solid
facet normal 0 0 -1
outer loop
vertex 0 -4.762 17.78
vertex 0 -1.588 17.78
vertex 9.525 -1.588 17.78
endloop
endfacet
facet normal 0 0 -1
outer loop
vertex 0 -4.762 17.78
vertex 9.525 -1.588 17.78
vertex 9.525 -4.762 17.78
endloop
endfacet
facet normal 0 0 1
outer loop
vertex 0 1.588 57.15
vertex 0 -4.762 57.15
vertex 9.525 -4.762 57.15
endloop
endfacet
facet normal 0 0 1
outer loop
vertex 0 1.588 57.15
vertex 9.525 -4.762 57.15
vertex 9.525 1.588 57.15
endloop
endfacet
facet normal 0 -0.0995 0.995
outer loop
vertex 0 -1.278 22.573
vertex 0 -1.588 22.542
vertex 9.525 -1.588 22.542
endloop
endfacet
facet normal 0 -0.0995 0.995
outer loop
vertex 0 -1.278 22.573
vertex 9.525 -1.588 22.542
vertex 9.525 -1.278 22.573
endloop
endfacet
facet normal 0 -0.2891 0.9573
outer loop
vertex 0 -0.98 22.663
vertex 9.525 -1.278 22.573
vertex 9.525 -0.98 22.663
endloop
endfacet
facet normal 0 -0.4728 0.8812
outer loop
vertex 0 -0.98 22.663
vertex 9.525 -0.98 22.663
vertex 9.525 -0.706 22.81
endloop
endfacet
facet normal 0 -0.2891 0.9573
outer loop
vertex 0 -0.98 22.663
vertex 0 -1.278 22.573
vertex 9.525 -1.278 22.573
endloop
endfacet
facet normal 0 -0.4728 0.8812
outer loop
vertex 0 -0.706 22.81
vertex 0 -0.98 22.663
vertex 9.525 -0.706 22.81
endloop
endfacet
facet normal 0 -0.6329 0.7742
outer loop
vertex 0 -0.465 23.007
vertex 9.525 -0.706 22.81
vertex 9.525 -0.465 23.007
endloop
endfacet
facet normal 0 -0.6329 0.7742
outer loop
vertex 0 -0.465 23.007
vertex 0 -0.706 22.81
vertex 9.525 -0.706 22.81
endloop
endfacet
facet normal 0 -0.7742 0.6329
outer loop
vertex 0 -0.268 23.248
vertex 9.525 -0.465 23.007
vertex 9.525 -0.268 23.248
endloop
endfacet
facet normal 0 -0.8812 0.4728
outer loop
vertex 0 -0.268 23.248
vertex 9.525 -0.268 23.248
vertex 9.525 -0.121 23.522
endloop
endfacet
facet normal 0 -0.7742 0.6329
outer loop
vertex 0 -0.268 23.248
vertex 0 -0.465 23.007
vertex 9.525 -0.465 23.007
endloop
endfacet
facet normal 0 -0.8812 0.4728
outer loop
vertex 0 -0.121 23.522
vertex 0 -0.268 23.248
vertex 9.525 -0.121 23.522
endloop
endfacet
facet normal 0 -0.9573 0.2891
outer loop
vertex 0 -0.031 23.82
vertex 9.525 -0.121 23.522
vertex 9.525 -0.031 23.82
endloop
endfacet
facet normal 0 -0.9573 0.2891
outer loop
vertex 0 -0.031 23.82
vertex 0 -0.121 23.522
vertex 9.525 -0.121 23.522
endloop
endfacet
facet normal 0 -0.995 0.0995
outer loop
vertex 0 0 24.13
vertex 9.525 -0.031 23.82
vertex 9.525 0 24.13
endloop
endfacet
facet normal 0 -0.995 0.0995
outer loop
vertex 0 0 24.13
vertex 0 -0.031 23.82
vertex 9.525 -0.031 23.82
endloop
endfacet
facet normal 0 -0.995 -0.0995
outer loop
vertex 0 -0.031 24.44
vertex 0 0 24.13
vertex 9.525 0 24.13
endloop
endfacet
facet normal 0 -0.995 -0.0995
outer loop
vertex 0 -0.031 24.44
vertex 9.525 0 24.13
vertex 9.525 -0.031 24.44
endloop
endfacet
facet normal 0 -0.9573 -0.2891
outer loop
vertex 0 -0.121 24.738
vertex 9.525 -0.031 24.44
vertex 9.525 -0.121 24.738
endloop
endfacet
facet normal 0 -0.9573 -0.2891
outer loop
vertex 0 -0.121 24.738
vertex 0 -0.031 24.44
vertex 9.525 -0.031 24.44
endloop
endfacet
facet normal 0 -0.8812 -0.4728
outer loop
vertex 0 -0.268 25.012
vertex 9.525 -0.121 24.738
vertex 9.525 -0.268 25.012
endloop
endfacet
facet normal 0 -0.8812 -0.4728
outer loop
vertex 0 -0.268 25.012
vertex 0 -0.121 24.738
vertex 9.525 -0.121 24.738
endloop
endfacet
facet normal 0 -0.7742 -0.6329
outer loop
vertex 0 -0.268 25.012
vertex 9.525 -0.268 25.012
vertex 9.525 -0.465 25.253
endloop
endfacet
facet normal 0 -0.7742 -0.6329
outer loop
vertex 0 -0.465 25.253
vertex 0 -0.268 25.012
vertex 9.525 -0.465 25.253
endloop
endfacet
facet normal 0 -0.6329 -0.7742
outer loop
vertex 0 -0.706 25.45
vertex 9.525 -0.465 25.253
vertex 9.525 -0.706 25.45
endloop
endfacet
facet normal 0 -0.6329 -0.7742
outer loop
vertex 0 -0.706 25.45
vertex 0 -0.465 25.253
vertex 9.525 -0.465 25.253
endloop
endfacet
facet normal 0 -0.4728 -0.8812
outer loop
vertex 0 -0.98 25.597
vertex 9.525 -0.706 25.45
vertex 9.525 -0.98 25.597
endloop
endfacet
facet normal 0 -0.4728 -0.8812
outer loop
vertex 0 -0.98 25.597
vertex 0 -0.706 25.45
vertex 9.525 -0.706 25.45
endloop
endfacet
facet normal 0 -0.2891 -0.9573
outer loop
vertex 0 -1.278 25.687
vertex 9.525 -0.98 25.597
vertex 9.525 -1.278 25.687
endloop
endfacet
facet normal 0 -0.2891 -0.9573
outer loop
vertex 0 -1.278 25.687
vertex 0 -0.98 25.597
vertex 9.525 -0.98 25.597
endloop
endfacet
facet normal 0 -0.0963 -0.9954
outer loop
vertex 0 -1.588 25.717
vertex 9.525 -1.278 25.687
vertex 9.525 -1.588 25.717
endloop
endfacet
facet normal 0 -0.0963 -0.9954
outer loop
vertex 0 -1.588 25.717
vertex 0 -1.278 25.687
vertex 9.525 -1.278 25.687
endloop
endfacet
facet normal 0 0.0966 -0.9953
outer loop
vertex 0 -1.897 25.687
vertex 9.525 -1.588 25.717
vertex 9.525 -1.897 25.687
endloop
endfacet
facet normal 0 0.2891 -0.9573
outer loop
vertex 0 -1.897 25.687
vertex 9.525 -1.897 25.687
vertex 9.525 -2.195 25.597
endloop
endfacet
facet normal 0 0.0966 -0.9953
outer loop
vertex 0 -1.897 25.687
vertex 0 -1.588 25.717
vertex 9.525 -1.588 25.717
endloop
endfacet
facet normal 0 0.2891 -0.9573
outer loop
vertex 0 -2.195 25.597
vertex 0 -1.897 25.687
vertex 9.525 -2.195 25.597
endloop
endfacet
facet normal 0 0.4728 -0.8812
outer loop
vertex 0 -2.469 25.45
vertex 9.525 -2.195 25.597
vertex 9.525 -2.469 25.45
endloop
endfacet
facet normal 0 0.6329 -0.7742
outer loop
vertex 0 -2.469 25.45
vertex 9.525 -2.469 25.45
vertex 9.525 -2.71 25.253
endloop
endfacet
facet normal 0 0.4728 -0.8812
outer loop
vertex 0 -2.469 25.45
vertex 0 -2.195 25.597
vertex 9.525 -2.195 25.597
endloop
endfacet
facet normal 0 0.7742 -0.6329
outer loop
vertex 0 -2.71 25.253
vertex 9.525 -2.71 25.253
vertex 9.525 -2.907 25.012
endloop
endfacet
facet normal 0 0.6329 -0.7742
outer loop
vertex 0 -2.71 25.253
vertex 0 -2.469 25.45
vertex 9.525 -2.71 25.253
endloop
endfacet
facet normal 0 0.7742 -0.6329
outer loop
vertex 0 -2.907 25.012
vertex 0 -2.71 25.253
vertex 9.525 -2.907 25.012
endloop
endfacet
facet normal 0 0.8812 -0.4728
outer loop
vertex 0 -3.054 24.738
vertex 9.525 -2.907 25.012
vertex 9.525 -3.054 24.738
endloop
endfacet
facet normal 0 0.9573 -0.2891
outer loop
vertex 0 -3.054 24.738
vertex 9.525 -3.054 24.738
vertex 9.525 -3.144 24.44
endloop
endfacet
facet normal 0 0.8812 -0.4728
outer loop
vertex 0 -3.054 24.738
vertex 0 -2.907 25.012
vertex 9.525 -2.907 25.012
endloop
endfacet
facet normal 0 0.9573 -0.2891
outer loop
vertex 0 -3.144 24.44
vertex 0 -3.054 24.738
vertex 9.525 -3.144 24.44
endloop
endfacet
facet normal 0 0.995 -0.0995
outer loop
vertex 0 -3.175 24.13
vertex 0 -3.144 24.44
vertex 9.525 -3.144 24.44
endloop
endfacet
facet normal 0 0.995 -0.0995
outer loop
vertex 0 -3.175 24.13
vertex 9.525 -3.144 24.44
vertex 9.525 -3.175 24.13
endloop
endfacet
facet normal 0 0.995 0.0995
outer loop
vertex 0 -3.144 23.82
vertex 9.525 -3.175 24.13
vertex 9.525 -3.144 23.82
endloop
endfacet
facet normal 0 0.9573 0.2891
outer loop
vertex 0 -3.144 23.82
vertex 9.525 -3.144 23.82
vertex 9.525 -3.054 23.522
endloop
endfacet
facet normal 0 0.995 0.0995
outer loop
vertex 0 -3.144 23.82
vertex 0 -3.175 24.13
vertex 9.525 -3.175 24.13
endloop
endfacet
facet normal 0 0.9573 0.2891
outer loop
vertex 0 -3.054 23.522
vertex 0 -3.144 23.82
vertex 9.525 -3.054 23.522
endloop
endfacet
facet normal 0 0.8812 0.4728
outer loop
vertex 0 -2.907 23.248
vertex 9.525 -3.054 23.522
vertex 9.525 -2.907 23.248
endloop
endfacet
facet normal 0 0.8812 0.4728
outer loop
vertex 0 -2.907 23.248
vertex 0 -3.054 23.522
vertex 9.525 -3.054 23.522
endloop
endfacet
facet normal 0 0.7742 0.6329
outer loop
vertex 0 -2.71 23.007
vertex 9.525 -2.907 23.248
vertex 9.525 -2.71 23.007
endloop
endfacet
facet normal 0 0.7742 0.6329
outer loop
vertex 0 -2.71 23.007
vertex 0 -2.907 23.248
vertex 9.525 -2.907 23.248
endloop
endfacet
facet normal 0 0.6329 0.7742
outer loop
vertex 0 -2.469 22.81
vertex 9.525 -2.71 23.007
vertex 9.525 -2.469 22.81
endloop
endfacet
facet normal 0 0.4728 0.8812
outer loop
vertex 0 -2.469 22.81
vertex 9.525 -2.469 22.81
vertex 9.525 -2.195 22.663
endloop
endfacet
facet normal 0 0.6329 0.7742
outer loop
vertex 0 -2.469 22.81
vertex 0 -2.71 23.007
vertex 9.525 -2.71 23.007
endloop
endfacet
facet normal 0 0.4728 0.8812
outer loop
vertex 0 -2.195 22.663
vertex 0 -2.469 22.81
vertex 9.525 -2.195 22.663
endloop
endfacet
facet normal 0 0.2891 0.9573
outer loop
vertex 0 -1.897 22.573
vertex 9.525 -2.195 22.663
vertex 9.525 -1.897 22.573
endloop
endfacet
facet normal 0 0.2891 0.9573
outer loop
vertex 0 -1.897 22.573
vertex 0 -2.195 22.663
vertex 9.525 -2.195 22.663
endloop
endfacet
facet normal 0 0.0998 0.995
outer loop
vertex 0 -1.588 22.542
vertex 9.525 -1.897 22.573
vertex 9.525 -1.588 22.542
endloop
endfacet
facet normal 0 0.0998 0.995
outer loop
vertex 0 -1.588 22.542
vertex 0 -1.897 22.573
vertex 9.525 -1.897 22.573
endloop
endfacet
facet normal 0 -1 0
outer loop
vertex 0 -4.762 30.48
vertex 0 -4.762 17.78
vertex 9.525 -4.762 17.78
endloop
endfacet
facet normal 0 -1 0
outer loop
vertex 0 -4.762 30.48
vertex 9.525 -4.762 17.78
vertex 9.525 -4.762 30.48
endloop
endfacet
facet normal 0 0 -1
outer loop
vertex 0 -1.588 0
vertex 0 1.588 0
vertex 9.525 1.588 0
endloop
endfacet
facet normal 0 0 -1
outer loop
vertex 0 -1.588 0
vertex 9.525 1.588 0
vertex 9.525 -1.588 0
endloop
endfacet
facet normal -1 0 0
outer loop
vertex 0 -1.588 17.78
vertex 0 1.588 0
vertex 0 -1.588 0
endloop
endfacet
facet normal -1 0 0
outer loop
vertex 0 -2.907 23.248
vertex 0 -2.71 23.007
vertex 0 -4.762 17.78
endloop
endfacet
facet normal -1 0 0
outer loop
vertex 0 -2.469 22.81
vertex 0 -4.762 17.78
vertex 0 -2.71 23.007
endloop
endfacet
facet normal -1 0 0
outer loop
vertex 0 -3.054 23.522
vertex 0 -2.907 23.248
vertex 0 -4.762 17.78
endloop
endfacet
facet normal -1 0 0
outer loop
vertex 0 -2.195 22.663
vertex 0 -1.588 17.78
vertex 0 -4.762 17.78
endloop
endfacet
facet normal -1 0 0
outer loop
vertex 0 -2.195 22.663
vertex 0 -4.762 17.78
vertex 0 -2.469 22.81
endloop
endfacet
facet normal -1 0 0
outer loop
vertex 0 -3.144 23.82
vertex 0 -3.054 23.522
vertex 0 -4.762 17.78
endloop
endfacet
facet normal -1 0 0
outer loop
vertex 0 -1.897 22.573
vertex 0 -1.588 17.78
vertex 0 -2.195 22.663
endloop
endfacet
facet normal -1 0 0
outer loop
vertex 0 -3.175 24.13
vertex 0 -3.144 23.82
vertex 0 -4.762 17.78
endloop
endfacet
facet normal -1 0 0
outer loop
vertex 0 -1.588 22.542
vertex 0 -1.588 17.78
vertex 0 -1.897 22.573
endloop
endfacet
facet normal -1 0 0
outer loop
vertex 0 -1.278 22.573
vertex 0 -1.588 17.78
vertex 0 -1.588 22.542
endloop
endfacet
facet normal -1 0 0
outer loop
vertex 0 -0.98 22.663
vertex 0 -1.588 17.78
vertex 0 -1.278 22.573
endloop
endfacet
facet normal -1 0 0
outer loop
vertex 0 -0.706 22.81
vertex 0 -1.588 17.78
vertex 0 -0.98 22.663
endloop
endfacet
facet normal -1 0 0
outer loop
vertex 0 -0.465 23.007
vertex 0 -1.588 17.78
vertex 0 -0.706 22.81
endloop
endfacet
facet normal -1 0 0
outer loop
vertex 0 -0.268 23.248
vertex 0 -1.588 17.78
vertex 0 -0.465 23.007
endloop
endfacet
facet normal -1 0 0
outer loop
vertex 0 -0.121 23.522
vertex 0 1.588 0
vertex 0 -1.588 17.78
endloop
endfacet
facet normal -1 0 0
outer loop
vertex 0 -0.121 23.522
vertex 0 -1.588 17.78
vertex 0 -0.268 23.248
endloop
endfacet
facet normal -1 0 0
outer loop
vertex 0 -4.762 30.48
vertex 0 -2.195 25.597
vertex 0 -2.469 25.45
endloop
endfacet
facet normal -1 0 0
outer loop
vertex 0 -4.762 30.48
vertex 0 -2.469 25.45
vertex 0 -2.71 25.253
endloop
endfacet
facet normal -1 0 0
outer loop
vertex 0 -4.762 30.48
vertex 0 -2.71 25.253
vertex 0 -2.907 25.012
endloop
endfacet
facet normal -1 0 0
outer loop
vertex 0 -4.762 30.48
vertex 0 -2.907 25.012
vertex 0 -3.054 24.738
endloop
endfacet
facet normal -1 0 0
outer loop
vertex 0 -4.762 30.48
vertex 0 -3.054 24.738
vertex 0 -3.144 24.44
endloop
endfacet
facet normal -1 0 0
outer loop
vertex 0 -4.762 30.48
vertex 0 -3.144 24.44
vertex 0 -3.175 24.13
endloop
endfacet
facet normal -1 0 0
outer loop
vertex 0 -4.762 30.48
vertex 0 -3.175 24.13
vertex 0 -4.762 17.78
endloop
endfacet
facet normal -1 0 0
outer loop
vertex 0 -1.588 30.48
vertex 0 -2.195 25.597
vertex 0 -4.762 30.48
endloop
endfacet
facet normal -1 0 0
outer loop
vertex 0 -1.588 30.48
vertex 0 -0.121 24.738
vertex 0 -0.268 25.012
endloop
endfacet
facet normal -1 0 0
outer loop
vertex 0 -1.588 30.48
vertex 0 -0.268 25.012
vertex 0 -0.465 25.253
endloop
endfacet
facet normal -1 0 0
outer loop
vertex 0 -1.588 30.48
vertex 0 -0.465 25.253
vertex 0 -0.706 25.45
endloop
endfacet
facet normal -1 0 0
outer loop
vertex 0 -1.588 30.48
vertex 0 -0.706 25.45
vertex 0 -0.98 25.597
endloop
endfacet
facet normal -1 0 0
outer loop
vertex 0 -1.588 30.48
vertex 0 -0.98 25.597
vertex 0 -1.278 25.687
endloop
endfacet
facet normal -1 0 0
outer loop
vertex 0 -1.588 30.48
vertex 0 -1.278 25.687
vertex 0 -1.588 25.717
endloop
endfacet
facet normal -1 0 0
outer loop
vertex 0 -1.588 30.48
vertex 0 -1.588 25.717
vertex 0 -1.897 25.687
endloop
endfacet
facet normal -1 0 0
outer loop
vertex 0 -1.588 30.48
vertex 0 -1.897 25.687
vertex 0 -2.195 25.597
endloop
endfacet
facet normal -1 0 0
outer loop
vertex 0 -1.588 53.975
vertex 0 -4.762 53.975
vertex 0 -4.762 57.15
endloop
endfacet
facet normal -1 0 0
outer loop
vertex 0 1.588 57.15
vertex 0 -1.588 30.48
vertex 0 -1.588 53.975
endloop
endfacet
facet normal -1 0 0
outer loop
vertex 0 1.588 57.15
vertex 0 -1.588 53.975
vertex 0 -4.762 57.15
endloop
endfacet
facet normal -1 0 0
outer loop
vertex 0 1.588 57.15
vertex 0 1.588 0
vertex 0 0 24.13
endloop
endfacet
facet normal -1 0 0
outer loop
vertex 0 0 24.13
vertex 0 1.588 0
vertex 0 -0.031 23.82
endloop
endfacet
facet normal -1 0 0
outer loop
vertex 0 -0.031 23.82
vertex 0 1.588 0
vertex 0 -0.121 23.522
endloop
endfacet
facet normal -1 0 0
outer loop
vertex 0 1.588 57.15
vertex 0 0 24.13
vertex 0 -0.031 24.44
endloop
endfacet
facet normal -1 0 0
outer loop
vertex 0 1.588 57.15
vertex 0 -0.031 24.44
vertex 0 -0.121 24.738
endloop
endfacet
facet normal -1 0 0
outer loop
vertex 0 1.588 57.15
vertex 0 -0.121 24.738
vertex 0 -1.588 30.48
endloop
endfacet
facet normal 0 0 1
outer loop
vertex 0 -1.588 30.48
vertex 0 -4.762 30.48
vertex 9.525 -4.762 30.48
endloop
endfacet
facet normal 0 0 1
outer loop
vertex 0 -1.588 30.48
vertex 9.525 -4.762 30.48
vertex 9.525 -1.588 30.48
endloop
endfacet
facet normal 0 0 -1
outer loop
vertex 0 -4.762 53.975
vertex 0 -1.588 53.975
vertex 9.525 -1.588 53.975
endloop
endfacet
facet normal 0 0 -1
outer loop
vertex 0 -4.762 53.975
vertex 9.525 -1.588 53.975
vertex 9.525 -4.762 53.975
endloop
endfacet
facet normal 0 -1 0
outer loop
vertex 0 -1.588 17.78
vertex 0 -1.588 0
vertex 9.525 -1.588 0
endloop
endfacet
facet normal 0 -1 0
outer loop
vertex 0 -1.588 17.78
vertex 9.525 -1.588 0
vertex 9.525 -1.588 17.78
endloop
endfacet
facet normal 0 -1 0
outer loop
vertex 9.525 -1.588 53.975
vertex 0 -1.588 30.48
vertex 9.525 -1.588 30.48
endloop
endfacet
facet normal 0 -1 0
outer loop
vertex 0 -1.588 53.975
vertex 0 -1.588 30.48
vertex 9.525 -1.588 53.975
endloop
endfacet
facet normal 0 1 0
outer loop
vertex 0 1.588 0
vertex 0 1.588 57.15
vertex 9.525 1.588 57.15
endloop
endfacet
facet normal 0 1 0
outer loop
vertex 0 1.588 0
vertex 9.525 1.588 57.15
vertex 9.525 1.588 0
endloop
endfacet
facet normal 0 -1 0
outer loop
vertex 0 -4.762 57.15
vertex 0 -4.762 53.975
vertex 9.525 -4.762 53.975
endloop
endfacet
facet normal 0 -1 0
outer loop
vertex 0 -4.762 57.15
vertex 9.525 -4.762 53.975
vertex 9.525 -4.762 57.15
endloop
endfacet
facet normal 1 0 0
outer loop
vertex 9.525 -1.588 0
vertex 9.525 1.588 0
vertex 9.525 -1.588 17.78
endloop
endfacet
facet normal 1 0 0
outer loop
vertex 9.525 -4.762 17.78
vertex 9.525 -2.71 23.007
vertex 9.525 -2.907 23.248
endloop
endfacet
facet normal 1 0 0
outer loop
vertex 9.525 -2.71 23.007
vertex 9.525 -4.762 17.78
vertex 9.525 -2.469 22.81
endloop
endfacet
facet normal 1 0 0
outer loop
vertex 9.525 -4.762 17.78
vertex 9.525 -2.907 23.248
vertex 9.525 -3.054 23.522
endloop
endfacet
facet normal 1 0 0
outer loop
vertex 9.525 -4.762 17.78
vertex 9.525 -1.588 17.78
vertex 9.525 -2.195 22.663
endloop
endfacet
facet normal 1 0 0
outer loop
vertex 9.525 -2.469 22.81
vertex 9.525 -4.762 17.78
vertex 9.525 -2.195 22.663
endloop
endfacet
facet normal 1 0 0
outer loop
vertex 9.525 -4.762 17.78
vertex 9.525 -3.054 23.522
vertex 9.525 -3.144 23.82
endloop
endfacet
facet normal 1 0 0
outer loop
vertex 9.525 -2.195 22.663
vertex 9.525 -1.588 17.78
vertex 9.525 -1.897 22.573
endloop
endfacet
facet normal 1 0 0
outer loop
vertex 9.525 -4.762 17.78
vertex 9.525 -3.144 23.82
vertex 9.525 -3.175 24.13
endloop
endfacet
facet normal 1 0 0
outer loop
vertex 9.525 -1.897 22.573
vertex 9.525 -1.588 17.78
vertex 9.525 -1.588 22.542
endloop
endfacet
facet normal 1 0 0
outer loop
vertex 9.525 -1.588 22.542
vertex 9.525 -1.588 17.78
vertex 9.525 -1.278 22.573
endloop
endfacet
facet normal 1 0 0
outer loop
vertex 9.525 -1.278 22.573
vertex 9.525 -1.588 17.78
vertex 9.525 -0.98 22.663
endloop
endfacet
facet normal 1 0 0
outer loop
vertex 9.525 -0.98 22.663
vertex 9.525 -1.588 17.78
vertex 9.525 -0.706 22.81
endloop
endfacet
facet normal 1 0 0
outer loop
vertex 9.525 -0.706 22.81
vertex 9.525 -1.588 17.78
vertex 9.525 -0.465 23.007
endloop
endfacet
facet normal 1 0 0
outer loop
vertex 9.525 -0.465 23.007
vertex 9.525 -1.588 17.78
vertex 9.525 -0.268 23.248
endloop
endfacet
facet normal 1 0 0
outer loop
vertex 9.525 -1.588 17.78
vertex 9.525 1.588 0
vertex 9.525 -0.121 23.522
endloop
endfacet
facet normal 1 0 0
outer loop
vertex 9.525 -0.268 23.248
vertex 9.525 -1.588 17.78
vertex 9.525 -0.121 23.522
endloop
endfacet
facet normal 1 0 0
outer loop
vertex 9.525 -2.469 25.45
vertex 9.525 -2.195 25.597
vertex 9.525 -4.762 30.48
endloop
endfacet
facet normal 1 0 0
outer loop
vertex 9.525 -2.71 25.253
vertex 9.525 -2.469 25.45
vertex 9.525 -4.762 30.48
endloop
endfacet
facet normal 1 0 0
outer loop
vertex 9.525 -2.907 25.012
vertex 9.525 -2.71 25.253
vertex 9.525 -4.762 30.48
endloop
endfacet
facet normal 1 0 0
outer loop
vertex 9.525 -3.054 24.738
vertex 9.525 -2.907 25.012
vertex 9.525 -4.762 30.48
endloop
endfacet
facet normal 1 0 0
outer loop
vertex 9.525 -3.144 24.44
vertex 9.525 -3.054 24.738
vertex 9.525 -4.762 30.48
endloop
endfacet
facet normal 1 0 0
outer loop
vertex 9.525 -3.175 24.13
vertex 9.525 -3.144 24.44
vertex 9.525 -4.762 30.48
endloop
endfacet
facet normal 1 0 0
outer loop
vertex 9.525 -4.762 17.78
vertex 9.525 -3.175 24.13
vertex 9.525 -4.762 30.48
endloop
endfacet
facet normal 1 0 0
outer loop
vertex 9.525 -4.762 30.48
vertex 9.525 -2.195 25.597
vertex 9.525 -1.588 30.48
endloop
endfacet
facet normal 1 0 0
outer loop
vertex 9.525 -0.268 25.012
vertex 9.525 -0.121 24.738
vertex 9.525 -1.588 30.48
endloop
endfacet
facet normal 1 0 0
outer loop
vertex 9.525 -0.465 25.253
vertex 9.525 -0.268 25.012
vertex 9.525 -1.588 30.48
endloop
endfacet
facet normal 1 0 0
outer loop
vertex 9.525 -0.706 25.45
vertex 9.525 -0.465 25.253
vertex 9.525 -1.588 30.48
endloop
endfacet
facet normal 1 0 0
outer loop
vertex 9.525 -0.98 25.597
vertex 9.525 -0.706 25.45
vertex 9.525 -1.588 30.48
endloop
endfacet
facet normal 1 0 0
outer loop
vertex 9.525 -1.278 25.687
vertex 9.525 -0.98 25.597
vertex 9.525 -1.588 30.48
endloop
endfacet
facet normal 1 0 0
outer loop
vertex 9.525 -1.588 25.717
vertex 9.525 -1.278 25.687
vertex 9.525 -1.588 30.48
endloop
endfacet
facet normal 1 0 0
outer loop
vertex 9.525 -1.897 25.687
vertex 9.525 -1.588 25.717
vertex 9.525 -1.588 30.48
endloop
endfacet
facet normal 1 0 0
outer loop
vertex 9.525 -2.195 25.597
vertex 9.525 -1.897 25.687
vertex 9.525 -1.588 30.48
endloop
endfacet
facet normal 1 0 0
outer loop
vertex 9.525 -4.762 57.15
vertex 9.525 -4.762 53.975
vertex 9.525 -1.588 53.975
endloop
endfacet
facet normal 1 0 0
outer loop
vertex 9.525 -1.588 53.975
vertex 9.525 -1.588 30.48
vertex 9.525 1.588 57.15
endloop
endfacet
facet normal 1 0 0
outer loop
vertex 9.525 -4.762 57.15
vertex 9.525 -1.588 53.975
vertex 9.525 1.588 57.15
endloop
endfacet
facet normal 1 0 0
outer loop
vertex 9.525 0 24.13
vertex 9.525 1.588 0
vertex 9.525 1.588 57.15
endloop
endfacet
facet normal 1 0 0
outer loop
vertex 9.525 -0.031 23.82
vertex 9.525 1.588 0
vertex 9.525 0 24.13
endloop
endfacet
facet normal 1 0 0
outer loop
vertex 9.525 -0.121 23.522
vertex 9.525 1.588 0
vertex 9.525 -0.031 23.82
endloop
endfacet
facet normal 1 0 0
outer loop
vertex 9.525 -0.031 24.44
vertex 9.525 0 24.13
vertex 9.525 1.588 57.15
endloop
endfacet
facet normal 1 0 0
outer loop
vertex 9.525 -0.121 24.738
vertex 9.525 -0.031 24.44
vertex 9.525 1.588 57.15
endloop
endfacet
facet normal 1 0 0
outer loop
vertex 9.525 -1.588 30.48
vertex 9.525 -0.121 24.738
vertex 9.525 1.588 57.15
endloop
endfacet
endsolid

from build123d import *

# Parameters (mm, degrees)
SKETCH1_R           = 1.5875
BOSS_EXTRUDE1_DEPTH = 9.525


with BuildPart() as part:
    # Sketch1 → Boss-Extrude1 (new body)
    with BuildSketch(Plane(origin=(0, 0, 0), x_dir=(0, 0, -1), z_dir=(1, 0, 0))):
        Polygon((0, 1.5875), (0, -1.5875), (-17.78, -1.5875), (-17.78, -4.7625), (-30.48, -4.7625), (-30.48, -1.5875), (-53.975, -1.5875), (-53.975, -4.7625), (-57.15, -4.7625), (-57.15, 1.5875), align=None)
        with Locations((-24.13, -1.5875)):
            Circle(SKETCH1_R, mode=Mode.SUBTRACT)
    extrude(amount=BOSS_EXTRUDE1_DEPTH)


solid = part.part
